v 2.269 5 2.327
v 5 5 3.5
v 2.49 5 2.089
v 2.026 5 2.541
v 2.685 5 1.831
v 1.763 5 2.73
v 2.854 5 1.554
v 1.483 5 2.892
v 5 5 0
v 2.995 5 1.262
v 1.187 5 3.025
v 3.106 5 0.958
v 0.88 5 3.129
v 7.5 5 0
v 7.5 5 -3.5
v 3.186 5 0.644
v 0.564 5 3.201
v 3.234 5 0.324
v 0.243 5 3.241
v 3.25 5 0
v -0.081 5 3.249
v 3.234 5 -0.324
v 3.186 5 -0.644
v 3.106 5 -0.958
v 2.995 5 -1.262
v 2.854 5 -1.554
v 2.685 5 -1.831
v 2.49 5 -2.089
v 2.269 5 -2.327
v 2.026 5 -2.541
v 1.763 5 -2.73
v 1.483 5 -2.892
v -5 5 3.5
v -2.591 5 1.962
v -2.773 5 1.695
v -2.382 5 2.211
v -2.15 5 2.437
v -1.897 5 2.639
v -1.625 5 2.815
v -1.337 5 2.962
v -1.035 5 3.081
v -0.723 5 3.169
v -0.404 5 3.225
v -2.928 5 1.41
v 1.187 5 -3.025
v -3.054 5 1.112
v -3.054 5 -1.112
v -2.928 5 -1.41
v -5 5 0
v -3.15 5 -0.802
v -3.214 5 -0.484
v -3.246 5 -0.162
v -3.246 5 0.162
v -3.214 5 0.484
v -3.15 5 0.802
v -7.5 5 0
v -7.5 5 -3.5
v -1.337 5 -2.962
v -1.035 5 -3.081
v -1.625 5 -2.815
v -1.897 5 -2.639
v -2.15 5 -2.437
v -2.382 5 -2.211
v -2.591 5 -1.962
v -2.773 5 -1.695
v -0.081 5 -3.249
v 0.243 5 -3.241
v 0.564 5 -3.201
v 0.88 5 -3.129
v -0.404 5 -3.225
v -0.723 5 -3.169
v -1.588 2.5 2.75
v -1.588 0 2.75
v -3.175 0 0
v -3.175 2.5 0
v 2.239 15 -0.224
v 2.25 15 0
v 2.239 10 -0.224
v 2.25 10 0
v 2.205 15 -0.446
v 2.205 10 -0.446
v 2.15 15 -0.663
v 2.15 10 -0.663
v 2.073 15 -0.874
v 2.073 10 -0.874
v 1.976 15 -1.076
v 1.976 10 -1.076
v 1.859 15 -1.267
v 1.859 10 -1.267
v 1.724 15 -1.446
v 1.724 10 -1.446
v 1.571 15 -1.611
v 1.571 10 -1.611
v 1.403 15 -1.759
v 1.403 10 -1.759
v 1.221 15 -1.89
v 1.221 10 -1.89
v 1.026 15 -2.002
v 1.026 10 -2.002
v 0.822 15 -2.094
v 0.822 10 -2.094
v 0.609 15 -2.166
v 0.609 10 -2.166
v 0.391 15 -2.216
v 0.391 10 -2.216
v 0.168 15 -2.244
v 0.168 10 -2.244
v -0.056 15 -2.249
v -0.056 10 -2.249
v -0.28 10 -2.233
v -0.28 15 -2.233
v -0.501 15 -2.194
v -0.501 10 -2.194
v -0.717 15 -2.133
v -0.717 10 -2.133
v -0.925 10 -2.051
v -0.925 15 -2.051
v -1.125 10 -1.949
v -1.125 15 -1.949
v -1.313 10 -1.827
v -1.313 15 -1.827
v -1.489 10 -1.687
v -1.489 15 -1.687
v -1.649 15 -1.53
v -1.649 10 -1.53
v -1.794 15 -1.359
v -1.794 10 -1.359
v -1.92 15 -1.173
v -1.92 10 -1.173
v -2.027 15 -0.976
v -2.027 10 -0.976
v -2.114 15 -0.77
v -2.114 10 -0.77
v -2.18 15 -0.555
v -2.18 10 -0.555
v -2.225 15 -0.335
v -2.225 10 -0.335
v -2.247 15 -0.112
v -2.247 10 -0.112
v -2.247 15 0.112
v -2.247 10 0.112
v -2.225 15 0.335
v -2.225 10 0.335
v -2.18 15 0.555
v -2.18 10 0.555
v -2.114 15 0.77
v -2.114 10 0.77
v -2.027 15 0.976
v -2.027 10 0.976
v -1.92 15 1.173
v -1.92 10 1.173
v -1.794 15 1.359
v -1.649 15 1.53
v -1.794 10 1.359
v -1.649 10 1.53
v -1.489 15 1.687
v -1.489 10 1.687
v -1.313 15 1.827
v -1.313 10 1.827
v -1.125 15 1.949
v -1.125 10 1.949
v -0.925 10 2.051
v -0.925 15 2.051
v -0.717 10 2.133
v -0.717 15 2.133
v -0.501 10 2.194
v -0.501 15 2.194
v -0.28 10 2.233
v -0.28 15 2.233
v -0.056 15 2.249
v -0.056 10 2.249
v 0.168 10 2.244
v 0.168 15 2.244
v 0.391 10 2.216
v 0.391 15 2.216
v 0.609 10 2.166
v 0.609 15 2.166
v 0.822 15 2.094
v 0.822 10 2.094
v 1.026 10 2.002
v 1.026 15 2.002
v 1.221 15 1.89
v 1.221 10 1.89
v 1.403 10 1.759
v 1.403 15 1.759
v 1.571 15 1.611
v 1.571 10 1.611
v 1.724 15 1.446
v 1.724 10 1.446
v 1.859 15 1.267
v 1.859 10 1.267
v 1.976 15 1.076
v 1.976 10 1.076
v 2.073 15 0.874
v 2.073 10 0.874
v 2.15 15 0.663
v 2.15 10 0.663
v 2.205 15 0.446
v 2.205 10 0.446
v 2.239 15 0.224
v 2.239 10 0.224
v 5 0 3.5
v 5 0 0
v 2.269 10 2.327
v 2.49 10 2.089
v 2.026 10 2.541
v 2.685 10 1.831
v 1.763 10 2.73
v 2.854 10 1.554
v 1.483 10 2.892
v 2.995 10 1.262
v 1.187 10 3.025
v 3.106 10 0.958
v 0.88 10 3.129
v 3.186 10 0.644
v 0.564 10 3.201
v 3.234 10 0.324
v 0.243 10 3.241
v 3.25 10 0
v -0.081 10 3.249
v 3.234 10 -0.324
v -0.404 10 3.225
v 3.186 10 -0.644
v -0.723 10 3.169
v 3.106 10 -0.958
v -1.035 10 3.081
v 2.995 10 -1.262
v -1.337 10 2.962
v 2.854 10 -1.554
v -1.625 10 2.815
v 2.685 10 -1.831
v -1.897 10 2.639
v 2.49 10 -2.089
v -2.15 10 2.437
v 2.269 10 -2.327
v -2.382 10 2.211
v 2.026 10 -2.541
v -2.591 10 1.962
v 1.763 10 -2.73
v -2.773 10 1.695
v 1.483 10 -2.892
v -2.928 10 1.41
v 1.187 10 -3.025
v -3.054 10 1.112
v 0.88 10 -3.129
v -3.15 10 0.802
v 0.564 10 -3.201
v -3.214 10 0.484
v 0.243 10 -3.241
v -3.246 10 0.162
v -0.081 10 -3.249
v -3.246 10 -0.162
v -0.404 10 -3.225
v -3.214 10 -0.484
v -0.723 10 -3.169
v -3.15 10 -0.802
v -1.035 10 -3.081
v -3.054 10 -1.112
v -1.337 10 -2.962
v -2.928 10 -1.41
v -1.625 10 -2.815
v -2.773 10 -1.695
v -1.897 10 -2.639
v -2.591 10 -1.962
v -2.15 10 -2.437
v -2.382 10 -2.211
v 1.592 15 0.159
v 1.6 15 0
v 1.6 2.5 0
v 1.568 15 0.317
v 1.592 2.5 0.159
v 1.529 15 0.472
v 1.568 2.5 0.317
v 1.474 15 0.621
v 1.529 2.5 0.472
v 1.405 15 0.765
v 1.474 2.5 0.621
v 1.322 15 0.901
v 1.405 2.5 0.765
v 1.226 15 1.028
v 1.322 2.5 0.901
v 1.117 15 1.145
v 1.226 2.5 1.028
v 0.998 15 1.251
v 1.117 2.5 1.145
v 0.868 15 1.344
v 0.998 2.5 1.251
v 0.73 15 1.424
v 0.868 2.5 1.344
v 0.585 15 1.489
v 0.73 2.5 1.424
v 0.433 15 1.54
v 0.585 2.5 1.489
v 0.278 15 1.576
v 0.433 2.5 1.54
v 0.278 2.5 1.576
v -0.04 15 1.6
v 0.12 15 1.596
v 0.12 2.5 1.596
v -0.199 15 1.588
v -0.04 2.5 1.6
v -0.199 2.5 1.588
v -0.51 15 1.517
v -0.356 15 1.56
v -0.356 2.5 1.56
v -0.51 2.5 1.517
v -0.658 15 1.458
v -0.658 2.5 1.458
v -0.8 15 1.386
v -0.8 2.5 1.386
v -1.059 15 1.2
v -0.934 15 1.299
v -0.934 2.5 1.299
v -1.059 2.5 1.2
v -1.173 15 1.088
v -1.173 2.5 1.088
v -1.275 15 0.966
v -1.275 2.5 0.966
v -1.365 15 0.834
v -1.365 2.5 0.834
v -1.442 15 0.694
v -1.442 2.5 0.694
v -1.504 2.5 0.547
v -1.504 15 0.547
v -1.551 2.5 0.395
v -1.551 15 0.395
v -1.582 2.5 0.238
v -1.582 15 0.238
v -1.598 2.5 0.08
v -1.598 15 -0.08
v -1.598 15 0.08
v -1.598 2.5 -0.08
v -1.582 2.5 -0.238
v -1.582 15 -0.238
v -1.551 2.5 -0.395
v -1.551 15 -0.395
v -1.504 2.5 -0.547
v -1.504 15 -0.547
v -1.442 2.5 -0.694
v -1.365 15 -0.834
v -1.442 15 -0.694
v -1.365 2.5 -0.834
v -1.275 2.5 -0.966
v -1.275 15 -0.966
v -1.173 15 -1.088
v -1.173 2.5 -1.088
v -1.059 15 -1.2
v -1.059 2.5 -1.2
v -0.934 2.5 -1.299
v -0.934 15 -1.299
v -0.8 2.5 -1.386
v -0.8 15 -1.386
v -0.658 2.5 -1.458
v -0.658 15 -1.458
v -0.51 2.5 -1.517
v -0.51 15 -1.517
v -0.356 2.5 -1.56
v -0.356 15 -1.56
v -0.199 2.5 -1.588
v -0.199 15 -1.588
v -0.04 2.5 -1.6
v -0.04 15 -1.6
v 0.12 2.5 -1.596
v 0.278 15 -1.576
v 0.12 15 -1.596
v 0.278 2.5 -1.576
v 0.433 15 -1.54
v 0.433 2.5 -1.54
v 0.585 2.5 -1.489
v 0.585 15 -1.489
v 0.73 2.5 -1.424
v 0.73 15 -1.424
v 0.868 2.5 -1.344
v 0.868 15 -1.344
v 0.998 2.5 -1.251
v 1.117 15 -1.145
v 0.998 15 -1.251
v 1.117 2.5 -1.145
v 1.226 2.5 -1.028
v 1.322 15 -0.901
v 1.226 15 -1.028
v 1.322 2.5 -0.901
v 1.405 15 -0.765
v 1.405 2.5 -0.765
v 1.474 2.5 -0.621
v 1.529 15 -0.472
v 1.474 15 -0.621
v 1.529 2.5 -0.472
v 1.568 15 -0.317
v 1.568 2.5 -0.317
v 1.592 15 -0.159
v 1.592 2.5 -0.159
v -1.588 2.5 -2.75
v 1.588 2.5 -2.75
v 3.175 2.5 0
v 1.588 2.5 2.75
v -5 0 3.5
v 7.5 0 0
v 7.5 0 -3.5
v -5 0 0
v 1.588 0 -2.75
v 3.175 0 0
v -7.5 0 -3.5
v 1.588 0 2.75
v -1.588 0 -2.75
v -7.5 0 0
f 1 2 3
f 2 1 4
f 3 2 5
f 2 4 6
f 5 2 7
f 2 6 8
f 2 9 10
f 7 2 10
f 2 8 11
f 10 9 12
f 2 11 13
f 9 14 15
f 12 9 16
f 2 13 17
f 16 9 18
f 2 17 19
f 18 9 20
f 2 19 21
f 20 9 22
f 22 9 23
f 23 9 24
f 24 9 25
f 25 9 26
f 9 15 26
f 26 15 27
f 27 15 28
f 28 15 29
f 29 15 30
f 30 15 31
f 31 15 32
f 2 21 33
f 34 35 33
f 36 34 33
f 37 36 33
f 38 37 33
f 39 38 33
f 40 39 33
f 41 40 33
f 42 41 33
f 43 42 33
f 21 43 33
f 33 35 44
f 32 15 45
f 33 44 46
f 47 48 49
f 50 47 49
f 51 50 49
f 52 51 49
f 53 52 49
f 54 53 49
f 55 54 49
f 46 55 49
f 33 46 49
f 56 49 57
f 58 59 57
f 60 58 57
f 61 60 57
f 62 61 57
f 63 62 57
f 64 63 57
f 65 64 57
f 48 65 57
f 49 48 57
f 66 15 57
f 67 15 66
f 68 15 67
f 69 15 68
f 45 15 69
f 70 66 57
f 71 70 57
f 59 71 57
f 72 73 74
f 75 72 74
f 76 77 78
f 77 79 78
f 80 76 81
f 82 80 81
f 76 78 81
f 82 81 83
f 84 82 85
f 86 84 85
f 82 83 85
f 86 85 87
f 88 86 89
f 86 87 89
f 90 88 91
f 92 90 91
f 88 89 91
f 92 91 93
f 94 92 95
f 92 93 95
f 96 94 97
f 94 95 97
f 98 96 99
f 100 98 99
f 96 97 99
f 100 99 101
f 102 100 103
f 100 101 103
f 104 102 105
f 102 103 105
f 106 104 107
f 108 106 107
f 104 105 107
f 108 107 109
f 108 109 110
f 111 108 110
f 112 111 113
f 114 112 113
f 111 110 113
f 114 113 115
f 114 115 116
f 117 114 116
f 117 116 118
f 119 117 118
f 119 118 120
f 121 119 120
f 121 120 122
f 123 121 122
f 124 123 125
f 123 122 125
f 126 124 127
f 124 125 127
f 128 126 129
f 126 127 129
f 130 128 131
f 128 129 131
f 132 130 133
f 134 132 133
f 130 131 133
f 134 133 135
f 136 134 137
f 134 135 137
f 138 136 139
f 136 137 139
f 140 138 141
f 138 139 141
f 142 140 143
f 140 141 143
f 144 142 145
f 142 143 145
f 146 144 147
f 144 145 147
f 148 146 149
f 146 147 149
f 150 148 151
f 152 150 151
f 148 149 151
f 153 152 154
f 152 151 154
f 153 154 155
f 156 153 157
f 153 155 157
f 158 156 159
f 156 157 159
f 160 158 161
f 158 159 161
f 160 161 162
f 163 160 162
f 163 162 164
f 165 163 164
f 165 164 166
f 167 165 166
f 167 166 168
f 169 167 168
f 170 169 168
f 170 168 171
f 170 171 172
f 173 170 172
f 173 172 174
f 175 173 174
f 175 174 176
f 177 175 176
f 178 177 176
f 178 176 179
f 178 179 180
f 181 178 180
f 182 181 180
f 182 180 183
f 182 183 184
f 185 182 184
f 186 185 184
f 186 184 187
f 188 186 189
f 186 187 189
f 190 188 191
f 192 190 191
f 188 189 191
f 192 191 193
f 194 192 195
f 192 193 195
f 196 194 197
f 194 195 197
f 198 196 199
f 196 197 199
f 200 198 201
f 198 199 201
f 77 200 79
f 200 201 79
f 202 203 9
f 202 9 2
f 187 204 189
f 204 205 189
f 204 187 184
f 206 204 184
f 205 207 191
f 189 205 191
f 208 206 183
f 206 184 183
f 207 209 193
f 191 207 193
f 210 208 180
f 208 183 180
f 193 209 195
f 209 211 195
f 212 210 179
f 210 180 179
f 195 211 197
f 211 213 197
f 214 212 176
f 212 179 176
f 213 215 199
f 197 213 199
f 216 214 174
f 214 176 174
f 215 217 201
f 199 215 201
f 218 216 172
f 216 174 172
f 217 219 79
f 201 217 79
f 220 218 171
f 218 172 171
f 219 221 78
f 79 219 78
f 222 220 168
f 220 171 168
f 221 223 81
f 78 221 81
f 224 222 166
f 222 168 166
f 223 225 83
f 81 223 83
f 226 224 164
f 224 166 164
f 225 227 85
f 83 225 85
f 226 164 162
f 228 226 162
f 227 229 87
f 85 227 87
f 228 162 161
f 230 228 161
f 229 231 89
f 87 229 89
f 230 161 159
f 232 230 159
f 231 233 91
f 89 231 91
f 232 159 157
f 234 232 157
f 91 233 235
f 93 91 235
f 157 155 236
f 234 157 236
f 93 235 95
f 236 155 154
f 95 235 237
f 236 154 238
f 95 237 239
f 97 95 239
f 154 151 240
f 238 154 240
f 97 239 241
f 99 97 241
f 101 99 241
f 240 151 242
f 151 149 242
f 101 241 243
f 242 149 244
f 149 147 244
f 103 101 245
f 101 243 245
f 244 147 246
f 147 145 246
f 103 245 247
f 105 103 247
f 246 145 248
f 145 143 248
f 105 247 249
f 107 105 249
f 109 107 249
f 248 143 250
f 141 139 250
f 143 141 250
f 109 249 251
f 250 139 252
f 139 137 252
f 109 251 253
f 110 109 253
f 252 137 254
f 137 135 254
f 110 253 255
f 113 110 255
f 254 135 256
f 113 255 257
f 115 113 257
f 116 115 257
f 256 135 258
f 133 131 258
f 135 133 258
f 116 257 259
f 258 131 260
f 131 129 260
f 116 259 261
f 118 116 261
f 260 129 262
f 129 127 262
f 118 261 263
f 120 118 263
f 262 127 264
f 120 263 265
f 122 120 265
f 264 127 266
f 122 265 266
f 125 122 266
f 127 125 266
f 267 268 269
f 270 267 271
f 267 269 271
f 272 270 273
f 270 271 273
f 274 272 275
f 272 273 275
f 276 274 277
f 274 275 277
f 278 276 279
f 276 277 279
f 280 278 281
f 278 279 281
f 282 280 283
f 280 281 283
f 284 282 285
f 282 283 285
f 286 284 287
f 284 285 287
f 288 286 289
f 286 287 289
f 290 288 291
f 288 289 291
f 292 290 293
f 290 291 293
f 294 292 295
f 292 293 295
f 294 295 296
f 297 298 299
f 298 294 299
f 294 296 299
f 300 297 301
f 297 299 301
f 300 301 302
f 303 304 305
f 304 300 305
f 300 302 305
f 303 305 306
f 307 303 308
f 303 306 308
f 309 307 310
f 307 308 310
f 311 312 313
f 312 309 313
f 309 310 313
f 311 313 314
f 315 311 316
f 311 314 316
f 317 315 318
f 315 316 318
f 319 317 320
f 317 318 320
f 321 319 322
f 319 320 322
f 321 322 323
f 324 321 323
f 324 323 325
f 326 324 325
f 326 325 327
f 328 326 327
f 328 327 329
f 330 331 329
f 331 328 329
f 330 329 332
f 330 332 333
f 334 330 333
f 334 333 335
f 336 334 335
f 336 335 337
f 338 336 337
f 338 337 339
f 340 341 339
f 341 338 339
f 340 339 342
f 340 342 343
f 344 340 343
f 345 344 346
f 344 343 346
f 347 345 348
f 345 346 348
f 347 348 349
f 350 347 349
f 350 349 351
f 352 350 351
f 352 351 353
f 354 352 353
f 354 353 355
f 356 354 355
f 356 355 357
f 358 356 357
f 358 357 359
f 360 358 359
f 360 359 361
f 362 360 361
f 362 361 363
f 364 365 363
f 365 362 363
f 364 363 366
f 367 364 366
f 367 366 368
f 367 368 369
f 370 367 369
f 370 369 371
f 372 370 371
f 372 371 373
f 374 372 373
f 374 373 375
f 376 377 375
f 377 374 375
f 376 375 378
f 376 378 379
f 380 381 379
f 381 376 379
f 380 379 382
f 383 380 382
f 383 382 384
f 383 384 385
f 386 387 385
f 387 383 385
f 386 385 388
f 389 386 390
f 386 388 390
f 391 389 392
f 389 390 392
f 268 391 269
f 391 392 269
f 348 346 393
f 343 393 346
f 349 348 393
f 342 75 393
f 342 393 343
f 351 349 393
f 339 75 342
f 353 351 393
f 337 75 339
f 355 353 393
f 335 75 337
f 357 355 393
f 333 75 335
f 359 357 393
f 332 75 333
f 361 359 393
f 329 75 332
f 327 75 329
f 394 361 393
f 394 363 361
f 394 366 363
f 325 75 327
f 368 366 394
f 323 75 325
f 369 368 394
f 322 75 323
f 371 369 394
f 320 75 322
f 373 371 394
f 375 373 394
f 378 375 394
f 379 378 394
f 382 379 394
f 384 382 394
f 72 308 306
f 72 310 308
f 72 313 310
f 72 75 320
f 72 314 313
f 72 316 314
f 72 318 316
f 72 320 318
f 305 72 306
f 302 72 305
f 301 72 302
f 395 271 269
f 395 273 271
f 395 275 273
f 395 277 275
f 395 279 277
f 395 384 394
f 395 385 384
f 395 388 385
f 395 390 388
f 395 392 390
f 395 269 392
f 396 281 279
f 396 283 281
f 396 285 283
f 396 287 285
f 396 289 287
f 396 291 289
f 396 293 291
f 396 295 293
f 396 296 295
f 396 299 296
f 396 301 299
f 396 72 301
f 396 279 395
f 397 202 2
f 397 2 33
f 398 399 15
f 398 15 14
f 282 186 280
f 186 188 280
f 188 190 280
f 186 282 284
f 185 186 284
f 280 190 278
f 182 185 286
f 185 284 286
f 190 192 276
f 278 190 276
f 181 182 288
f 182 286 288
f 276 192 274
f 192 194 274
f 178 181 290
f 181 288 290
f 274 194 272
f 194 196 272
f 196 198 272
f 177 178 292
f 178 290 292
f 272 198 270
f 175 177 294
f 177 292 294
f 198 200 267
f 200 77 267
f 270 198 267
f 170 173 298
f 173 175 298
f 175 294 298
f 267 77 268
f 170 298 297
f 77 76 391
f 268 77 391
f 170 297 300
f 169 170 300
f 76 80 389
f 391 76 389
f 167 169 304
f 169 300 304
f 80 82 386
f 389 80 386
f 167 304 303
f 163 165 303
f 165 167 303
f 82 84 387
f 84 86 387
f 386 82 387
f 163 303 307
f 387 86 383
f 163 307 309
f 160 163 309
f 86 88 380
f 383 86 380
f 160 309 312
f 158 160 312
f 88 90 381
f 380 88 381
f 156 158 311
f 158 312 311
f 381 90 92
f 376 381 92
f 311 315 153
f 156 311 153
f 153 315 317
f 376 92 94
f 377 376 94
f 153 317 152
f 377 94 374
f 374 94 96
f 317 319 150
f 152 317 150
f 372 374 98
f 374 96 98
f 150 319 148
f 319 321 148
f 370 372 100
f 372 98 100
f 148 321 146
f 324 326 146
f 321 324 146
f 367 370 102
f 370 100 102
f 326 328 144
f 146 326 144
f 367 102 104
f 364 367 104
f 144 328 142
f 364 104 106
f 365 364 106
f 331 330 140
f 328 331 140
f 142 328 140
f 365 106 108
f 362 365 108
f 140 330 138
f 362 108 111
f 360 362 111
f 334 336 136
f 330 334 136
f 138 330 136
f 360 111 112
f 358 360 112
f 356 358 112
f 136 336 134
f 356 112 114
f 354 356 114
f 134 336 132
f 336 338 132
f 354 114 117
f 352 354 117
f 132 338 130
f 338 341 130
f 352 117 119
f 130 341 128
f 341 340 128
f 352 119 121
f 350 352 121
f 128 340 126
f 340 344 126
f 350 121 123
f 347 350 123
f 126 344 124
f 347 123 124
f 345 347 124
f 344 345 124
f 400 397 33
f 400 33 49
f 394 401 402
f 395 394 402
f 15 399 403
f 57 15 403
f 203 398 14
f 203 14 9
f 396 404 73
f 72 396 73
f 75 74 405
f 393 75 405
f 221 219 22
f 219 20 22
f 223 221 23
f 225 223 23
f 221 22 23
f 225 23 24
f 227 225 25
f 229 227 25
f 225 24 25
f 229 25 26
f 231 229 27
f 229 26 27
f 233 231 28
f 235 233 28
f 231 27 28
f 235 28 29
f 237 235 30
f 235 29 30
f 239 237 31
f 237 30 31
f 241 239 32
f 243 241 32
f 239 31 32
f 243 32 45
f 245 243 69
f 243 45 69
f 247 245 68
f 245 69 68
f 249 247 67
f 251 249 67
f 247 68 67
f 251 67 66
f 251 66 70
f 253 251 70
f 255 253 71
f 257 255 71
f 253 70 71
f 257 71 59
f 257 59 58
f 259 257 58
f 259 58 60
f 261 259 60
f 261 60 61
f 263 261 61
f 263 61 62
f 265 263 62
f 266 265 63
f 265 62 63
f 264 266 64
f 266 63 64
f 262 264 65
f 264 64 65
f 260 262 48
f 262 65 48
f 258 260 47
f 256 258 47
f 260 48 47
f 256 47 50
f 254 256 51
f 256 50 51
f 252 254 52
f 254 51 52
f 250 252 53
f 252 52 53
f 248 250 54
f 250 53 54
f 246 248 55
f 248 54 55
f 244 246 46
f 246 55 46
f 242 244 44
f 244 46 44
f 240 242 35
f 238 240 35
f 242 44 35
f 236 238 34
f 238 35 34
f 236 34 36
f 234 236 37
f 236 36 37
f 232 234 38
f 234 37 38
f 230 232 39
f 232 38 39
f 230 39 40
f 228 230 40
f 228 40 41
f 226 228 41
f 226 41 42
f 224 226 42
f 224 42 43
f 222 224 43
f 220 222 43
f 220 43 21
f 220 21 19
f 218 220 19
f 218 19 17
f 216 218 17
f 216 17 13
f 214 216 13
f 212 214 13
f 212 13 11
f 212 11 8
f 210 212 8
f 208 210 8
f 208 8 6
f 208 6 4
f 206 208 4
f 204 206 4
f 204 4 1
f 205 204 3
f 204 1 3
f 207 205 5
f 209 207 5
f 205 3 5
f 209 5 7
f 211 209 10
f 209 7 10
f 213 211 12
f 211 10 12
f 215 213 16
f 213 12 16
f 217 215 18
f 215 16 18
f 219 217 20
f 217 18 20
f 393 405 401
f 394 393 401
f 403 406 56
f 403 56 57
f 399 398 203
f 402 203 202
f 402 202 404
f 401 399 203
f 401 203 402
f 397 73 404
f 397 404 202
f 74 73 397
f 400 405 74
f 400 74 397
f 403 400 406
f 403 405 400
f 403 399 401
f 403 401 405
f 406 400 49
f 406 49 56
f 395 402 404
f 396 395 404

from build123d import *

# Parameters (mm, degrees)
BOSS_EXTRUDE1_DEPTH = 5
CUT_EXTRUDE1_DEPTH  = 2.5
SKETCH5_R           = 1.6
CUT_EXTRUDE2_DEPTH  = 13.5


with BuildPart() as part:
    # Sketch2 → Boss-Extrude1 (new body)
    with BuildSketch(Plane(origin=(0, 0, 0), x_dir=(1, 0, 0), z_dir=(0, 1, 0))):
        Polygon((-5, 0), (-7.5, 0), (-7.5, 3.5), (-5, 3.5), (5, 3.5), (7.5, 3.5), (7.5, 0), (5, 0), (5, -3.5), (-5, -3.5), align=None)
    extrude(amount=BOSS_EXTRUDE1_DEPTH)

    # Sketch3 → Cut-Extrude1 (cut)
    with BuildSketch(Plane.XZ):
        Polygon((3.175426481, 0), (1.58771324, 2.75), (-1.58771324, 2.75), (-3.175426481, 0), (-1.58771324, -2.75), (1.58771324, -2.75), align=None)
    extrude(amount=-CUT_EXTRUDE1_DEPTH, mode=Mode.SUBTRACT)

    # Sketch4 → Revolve1 (revolve)
    with BuildSketch(Plane.XY):
        Polygon((1.6, 5), (1.6, 15), (2.25, 15), (2.25, 10), (3.25, 10), (3.25, 5), align=None)
    revolve(axis=Axis((0, 0, 0), (0, 1, 0)))

    # Sketch5 → Cut-Extrude2 (cut, through all)
    with BuildSketch(Plane.XZ.offset(-2.5)):
        Circle(SKETCH5_R)
    extrude(amount=-CUT_EXTRUDE2_DEPTH, mode=Mode.SUBTRACT)


solid = part.part
